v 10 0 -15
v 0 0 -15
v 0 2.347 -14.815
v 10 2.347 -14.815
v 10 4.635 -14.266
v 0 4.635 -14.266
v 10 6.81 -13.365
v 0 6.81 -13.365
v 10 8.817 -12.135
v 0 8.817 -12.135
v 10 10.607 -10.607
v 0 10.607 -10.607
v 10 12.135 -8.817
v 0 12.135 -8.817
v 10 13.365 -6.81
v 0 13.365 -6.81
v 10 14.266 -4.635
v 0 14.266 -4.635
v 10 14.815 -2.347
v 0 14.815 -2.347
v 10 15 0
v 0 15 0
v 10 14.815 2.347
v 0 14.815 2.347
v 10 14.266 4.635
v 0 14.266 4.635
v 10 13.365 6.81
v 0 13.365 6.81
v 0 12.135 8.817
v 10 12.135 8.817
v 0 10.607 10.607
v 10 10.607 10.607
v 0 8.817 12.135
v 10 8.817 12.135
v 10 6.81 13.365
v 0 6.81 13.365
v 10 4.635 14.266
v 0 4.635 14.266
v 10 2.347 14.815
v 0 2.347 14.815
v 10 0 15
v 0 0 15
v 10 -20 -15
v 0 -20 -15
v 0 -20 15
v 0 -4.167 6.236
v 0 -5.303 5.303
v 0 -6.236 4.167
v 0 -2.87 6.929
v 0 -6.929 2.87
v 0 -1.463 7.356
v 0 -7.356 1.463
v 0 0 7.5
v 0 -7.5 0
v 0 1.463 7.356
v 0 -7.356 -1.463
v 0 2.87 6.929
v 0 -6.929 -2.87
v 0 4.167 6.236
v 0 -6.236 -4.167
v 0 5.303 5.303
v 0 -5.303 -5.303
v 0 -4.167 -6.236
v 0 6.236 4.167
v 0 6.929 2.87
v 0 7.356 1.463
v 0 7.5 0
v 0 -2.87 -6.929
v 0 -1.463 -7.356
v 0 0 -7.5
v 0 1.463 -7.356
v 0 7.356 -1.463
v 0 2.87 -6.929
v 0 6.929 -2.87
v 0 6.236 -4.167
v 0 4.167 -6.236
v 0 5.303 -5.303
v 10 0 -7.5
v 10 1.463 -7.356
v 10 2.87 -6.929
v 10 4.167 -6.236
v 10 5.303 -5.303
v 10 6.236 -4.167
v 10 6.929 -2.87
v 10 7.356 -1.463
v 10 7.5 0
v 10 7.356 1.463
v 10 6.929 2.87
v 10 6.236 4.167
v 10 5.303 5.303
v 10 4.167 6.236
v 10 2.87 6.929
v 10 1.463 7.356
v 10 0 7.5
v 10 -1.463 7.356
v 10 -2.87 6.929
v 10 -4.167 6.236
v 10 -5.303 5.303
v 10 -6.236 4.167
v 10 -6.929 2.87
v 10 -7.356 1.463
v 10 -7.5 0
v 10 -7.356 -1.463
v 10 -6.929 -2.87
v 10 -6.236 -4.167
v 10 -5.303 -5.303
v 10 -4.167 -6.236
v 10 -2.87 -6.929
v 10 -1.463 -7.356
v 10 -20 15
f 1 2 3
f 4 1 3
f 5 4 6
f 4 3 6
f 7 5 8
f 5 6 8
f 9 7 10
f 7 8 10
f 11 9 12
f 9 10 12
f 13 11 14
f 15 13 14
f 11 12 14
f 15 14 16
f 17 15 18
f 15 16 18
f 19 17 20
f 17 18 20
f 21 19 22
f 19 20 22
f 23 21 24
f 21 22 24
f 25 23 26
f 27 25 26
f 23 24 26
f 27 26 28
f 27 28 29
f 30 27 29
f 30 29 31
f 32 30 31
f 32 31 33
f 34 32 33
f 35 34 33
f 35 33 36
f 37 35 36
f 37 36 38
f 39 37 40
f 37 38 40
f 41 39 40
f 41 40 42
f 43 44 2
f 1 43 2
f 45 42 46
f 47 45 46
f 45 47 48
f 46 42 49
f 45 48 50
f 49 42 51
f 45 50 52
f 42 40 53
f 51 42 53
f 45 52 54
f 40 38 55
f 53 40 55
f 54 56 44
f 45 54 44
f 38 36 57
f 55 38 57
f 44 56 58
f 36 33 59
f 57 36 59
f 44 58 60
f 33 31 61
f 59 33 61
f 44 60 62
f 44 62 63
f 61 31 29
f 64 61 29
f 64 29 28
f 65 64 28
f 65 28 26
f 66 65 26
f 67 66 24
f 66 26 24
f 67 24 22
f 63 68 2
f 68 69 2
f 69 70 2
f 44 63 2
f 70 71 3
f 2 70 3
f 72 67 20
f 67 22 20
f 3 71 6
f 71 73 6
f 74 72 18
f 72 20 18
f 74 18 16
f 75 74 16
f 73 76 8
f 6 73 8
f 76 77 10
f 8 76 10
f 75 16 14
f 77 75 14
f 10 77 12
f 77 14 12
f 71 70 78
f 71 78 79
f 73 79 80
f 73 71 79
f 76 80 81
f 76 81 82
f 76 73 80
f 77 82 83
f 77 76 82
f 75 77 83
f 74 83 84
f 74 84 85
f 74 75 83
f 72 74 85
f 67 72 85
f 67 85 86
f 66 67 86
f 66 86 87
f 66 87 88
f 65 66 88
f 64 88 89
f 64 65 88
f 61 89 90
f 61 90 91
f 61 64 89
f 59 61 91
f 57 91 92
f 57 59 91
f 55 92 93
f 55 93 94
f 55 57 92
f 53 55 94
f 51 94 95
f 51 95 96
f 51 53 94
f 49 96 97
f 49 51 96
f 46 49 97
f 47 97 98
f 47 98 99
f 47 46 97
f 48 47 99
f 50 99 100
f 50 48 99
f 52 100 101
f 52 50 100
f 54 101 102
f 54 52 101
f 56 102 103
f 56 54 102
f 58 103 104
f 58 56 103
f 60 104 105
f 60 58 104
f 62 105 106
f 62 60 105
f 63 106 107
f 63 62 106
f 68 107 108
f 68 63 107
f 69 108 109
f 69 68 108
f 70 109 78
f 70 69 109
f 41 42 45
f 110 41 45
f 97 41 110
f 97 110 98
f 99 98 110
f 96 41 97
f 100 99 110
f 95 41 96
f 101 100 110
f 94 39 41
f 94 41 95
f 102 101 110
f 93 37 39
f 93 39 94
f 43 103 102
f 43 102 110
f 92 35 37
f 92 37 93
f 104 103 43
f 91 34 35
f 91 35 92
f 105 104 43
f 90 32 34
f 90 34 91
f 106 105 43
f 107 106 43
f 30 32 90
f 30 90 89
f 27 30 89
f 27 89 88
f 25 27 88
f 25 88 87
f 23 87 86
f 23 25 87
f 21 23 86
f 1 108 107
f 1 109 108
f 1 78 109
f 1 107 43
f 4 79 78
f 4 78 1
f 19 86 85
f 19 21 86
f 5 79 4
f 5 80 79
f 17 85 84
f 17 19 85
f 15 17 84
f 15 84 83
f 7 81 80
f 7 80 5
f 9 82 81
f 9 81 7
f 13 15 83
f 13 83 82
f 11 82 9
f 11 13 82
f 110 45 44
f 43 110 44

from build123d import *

# Parameters (mm, degrees)
SKETCH1_R           = 7.5
BOSS_EXTRUDE1_DEPTH = 10


with BuildPart() as part:
    # Sketch1 → Boss-Extrude1 (new body)
    with BuildSketch(Plane(origin=(0, 0, 0), x_dir=(0, 0, -1), z_dir=(1, 0, 0))):
        with BuildLine():
            Line((-15, -20), (15, -20))
            Line((15, -20), (15, 0))
            ThreePointArc((15, 0), (0, 15), (-15, 0))
            Line((-15, 0), (-15, -20))
        make_face()
        Circle(SKETCH1_R, mode=Mode.SUBTRACT)
    extrude(amount=BOSS_EXTRUDE1_DEPTH)


solid = part.part
